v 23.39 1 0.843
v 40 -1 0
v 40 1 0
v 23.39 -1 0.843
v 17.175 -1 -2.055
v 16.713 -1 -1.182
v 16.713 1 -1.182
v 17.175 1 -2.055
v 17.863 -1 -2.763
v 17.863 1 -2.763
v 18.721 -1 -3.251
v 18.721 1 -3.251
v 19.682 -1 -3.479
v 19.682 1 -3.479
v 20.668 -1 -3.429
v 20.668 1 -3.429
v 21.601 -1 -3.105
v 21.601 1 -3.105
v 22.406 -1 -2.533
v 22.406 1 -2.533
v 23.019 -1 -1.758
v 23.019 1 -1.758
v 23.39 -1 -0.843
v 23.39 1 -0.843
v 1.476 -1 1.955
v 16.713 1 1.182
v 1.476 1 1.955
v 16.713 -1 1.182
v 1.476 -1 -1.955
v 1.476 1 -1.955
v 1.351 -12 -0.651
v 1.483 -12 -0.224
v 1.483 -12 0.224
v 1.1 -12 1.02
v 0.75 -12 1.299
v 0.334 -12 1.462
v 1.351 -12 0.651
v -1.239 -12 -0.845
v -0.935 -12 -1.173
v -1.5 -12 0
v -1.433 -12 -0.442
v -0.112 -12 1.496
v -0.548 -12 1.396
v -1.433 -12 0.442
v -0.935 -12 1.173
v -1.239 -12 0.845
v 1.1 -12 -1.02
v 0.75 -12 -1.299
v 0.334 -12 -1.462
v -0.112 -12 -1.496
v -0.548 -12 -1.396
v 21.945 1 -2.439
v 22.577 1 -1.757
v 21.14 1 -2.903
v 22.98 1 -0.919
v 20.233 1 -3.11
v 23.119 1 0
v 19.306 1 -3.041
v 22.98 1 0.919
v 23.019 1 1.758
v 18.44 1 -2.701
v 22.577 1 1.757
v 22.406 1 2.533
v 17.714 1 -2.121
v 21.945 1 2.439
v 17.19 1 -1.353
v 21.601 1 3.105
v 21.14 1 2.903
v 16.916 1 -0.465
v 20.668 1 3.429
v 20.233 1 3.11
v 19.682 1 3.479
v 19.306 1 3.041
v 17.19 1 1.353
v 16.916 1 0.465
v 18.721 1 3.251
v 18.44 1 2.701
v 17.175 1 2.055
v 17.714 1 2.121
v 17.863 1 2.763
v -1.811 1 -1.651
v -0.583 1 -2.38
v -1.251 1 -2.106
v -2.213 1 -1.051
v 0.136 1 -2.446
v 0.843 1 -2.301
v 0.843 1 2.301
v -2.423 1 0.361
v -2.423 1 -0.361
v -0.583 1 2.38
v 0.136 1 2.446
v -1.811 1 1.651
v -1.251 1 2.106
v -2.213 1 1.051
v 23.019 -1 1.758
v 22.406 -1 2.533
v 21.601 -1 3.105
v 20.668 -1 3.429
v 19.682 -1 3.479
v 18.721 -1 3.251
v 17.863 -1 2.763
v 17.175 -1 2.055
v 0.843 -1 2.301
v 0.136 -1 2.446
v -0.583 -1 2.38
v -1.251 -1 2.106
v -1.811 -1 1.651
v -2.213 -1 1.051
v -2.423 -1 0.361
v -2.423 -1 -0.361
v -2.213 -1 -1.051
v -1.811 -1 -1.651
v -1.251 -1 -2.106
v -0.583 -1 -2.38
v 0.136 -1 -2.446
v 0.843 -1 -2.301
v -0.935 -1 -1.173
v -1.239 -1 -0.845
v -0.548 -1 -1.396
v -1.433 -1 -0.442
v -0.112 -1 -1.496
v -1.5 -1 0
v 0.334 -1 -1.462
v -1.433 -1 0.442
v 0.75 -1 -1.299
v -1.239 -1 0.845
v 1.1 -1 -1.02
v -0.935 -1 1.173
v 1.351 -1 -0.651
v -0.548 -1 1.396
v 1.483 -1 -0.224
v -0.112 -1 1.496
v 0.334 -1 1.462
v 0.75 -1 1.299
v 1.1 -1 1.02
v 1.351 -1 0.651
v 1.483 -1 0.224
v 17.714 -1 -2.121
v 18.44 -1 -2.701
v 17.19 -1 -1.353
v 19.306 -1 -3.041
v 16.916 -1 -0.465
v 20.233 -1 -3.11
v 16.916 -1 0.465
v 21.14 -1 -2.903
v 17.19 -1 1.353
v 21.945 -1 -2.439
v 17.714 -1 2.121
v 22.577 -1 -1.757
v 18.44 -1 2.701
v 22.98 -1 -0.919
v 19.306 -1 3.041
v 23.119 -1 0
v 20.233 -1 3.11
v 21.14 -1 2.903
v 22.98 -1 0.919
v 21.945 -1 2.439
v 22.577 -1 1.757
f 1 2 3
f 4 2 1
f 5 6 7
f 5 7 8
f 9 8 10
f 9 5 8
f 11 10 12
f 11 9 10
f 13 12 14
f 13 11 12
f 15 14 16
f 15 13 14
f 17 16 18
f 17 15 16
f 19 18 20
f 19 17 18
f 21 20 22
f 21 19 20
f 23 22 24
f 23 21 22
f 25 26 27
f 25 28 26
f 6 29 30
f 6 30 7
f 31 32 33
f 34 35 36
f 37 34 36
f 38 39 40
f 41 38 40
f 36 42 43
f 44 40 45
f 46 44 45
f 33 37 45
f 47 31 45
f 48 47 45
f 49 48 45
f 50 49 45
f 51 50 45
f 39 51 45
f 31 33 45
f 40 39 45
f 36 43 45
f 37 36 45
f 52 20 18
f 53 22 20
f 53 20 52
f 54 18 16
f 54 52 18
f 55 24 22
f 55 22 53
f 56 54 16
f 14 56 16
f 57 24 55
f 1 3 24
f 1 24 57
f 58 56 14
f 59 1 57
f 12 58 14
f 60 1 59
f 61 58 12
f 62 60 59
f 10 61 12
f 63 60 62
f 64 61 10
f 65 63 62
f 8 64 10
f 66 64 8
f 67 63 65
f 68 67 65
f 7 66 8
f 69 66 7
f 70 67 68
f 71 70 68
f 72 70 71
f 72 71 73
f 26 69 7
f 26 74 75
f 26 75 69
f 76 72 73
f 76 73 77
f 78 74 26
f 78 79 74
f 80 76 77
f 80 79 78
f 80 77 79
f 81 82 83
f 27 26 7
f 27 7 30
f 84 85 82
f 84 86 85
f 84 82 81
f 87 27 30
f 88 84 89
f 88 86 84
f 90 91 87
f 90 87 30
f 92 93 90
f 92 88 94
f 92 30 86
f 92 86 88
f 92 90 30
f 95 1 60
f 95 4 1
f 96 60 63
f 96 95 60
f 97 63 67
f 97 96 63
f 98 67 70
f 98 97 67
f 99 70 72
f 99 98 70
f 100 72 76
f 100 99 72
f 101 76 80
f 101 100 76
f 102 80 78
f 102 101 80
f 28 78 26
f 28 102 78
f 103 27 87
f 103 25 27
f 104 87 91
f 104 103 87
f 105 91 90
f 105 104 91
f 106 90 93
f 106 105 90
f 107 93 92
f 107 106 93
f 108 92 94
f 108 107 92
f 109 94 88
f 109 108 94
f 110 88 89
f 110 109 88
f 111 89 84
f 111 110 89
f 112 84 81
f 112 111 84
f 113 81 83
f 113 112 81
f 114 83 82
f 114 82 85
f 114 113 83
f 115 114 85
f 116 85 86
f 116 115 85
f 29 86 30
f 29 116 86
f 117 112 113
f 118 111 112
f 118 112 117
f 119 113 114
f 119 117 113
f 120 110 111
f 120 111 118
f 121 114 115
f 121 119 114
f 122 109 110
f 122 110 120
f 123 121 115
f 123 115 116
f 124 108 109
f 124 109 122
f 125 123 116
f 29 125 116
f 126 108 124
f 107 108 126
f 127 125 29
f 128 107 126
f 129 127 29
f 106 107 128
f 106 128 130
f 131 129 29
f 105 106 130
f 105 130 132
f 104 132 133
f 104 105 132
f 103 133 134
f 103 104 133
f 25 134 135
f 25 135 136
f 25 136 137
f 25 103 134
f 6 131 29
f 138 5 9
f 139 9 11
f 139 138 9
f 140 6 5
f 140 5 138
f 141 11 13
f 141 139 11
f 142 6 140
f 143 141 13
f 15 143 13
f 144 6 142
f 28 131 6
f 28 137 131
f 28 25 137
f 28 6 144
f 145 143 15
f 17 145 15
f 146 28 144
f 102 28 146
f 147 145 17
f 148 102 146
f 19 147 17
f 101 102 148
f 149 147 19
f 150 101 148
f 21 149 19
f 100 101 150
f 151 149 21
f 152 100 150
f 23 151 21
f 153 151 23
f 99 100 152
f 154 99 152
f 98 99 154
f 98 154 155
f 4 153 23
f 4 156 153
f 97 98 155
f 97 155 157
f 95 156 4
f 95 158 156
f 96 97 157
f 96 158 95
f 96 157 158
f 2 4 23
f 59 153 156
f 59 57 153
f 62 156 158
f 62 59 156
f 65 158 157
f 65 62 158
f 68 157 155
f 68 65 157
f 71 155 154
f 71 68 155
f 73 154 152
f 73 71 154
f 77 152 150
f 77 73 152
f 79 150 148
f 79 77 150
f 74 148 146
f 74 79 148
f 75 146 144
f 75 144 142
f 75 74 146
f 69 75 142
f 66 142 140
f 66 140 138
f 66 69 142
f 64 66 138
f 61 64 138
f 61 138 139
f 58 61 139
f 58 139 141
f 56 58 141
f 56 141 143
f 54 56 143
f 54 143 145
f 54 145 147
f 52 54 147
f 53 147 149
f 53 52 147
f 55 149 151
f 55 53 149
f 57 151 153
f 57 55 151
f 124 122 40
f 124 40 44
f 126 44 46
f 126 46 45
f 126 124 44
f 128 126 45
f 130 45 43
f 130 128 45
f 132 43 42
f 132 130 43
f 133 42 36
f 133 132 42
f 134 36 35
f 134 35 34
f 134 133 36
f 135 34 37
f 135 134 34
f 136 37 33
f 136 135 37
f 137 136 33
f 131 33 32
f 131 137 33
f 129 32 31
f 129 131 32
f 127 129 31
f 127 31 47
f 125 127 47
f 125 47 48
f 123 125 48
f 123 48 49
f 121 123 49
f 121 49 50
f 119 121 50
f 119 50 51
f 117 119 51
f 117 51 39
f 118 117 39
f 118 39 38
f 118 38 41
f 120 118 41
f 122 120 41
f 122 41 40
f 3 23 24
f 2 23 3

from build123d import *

# Parameters (mm, degrees)
F0_R     = 3.119034
F1_DEPTH = 1
F2_R     = 1.5
F3_DEPTH = 13


with BuildPart() as f1:
    # F0 (on Front) → F1 (new body, symmetric)
    with BuildSketch(Plane.XZ):
        with BuildLine():
            ThreePointArc((1.47637, -1.955206), (2.193126, -1.092106), (2.45, 0))
            ThreePointArc((2.45, 0), (2.193126, 1.092106), (1.47637, 1.955206))
            ThreePointArc((1.47637, 1.955206), (-2.45, 0), (1.47637, -1.955206))
        make_face()
        with BuildLine():
            ThreePointArc((1.47637, 1.955206), (2.193126, 1.092106), (2.45, 0))
            ThreePointArc((2.45, 0), (2.193126, -1.092106), (1.47637, -1.955206))
            Line((1.47637, -1.955206), (16.712802, -1.181905))
            ThreePointArc((16.712802, -1.181905), (16.506782, 0), (16.712802, 1.181905))
            Line((16.712802, 1.181905), (1.47637, 1.955206))
        make_face()
        with BuildLine():
            ThreePointArc((23.38997, 0.843016), (20.177065, 3.488727), (16.712802, 1.181905))
            ThreePointArc((16.712802, 1.181905), (16.506782, 0), (16.712802, -1.181905))
            ThreePointArc((16.712802, -1.181905), (20.177065, -3.488727), (23.38997, -0.843016))
            ThreePointArc((23.38997, -0.843016), (23.46731, -0.424657), (23.493218, 0))
            ThreePointArc((23.493218, 0), (23.46731, 0.424657), (23.38997, 0.843016))
        make_face()
        with Locations((20, 0)):
            Circle(F0_R, mode=Mode.SUBTRACT)
        with BuildLine():
            Line((40, 0), (23.38997, 0.843016))
            ThreePointArc((23.38997, 0.843016), (23.46731, 0.424657), (23.493218, 0))
            ThreePointArc((23.493218, 0), (23.46731, -0.424657), (23.38997, -0.843016))
            Line((23.38997, -0.843016), (40, 0))
        make_face()
    extrude(amount=F1_DEPTH, both=True)

    # F2 (on face) → F3 (join)
    with BuildSketch(Plane(origin=(0, 1, 0), x_dir=(-1, 0, 0), z_dir=(0, 1, 0))):
        Circle(F2_R)
    extrude(amount=-F3_DEPTH)


solid = f1.part
